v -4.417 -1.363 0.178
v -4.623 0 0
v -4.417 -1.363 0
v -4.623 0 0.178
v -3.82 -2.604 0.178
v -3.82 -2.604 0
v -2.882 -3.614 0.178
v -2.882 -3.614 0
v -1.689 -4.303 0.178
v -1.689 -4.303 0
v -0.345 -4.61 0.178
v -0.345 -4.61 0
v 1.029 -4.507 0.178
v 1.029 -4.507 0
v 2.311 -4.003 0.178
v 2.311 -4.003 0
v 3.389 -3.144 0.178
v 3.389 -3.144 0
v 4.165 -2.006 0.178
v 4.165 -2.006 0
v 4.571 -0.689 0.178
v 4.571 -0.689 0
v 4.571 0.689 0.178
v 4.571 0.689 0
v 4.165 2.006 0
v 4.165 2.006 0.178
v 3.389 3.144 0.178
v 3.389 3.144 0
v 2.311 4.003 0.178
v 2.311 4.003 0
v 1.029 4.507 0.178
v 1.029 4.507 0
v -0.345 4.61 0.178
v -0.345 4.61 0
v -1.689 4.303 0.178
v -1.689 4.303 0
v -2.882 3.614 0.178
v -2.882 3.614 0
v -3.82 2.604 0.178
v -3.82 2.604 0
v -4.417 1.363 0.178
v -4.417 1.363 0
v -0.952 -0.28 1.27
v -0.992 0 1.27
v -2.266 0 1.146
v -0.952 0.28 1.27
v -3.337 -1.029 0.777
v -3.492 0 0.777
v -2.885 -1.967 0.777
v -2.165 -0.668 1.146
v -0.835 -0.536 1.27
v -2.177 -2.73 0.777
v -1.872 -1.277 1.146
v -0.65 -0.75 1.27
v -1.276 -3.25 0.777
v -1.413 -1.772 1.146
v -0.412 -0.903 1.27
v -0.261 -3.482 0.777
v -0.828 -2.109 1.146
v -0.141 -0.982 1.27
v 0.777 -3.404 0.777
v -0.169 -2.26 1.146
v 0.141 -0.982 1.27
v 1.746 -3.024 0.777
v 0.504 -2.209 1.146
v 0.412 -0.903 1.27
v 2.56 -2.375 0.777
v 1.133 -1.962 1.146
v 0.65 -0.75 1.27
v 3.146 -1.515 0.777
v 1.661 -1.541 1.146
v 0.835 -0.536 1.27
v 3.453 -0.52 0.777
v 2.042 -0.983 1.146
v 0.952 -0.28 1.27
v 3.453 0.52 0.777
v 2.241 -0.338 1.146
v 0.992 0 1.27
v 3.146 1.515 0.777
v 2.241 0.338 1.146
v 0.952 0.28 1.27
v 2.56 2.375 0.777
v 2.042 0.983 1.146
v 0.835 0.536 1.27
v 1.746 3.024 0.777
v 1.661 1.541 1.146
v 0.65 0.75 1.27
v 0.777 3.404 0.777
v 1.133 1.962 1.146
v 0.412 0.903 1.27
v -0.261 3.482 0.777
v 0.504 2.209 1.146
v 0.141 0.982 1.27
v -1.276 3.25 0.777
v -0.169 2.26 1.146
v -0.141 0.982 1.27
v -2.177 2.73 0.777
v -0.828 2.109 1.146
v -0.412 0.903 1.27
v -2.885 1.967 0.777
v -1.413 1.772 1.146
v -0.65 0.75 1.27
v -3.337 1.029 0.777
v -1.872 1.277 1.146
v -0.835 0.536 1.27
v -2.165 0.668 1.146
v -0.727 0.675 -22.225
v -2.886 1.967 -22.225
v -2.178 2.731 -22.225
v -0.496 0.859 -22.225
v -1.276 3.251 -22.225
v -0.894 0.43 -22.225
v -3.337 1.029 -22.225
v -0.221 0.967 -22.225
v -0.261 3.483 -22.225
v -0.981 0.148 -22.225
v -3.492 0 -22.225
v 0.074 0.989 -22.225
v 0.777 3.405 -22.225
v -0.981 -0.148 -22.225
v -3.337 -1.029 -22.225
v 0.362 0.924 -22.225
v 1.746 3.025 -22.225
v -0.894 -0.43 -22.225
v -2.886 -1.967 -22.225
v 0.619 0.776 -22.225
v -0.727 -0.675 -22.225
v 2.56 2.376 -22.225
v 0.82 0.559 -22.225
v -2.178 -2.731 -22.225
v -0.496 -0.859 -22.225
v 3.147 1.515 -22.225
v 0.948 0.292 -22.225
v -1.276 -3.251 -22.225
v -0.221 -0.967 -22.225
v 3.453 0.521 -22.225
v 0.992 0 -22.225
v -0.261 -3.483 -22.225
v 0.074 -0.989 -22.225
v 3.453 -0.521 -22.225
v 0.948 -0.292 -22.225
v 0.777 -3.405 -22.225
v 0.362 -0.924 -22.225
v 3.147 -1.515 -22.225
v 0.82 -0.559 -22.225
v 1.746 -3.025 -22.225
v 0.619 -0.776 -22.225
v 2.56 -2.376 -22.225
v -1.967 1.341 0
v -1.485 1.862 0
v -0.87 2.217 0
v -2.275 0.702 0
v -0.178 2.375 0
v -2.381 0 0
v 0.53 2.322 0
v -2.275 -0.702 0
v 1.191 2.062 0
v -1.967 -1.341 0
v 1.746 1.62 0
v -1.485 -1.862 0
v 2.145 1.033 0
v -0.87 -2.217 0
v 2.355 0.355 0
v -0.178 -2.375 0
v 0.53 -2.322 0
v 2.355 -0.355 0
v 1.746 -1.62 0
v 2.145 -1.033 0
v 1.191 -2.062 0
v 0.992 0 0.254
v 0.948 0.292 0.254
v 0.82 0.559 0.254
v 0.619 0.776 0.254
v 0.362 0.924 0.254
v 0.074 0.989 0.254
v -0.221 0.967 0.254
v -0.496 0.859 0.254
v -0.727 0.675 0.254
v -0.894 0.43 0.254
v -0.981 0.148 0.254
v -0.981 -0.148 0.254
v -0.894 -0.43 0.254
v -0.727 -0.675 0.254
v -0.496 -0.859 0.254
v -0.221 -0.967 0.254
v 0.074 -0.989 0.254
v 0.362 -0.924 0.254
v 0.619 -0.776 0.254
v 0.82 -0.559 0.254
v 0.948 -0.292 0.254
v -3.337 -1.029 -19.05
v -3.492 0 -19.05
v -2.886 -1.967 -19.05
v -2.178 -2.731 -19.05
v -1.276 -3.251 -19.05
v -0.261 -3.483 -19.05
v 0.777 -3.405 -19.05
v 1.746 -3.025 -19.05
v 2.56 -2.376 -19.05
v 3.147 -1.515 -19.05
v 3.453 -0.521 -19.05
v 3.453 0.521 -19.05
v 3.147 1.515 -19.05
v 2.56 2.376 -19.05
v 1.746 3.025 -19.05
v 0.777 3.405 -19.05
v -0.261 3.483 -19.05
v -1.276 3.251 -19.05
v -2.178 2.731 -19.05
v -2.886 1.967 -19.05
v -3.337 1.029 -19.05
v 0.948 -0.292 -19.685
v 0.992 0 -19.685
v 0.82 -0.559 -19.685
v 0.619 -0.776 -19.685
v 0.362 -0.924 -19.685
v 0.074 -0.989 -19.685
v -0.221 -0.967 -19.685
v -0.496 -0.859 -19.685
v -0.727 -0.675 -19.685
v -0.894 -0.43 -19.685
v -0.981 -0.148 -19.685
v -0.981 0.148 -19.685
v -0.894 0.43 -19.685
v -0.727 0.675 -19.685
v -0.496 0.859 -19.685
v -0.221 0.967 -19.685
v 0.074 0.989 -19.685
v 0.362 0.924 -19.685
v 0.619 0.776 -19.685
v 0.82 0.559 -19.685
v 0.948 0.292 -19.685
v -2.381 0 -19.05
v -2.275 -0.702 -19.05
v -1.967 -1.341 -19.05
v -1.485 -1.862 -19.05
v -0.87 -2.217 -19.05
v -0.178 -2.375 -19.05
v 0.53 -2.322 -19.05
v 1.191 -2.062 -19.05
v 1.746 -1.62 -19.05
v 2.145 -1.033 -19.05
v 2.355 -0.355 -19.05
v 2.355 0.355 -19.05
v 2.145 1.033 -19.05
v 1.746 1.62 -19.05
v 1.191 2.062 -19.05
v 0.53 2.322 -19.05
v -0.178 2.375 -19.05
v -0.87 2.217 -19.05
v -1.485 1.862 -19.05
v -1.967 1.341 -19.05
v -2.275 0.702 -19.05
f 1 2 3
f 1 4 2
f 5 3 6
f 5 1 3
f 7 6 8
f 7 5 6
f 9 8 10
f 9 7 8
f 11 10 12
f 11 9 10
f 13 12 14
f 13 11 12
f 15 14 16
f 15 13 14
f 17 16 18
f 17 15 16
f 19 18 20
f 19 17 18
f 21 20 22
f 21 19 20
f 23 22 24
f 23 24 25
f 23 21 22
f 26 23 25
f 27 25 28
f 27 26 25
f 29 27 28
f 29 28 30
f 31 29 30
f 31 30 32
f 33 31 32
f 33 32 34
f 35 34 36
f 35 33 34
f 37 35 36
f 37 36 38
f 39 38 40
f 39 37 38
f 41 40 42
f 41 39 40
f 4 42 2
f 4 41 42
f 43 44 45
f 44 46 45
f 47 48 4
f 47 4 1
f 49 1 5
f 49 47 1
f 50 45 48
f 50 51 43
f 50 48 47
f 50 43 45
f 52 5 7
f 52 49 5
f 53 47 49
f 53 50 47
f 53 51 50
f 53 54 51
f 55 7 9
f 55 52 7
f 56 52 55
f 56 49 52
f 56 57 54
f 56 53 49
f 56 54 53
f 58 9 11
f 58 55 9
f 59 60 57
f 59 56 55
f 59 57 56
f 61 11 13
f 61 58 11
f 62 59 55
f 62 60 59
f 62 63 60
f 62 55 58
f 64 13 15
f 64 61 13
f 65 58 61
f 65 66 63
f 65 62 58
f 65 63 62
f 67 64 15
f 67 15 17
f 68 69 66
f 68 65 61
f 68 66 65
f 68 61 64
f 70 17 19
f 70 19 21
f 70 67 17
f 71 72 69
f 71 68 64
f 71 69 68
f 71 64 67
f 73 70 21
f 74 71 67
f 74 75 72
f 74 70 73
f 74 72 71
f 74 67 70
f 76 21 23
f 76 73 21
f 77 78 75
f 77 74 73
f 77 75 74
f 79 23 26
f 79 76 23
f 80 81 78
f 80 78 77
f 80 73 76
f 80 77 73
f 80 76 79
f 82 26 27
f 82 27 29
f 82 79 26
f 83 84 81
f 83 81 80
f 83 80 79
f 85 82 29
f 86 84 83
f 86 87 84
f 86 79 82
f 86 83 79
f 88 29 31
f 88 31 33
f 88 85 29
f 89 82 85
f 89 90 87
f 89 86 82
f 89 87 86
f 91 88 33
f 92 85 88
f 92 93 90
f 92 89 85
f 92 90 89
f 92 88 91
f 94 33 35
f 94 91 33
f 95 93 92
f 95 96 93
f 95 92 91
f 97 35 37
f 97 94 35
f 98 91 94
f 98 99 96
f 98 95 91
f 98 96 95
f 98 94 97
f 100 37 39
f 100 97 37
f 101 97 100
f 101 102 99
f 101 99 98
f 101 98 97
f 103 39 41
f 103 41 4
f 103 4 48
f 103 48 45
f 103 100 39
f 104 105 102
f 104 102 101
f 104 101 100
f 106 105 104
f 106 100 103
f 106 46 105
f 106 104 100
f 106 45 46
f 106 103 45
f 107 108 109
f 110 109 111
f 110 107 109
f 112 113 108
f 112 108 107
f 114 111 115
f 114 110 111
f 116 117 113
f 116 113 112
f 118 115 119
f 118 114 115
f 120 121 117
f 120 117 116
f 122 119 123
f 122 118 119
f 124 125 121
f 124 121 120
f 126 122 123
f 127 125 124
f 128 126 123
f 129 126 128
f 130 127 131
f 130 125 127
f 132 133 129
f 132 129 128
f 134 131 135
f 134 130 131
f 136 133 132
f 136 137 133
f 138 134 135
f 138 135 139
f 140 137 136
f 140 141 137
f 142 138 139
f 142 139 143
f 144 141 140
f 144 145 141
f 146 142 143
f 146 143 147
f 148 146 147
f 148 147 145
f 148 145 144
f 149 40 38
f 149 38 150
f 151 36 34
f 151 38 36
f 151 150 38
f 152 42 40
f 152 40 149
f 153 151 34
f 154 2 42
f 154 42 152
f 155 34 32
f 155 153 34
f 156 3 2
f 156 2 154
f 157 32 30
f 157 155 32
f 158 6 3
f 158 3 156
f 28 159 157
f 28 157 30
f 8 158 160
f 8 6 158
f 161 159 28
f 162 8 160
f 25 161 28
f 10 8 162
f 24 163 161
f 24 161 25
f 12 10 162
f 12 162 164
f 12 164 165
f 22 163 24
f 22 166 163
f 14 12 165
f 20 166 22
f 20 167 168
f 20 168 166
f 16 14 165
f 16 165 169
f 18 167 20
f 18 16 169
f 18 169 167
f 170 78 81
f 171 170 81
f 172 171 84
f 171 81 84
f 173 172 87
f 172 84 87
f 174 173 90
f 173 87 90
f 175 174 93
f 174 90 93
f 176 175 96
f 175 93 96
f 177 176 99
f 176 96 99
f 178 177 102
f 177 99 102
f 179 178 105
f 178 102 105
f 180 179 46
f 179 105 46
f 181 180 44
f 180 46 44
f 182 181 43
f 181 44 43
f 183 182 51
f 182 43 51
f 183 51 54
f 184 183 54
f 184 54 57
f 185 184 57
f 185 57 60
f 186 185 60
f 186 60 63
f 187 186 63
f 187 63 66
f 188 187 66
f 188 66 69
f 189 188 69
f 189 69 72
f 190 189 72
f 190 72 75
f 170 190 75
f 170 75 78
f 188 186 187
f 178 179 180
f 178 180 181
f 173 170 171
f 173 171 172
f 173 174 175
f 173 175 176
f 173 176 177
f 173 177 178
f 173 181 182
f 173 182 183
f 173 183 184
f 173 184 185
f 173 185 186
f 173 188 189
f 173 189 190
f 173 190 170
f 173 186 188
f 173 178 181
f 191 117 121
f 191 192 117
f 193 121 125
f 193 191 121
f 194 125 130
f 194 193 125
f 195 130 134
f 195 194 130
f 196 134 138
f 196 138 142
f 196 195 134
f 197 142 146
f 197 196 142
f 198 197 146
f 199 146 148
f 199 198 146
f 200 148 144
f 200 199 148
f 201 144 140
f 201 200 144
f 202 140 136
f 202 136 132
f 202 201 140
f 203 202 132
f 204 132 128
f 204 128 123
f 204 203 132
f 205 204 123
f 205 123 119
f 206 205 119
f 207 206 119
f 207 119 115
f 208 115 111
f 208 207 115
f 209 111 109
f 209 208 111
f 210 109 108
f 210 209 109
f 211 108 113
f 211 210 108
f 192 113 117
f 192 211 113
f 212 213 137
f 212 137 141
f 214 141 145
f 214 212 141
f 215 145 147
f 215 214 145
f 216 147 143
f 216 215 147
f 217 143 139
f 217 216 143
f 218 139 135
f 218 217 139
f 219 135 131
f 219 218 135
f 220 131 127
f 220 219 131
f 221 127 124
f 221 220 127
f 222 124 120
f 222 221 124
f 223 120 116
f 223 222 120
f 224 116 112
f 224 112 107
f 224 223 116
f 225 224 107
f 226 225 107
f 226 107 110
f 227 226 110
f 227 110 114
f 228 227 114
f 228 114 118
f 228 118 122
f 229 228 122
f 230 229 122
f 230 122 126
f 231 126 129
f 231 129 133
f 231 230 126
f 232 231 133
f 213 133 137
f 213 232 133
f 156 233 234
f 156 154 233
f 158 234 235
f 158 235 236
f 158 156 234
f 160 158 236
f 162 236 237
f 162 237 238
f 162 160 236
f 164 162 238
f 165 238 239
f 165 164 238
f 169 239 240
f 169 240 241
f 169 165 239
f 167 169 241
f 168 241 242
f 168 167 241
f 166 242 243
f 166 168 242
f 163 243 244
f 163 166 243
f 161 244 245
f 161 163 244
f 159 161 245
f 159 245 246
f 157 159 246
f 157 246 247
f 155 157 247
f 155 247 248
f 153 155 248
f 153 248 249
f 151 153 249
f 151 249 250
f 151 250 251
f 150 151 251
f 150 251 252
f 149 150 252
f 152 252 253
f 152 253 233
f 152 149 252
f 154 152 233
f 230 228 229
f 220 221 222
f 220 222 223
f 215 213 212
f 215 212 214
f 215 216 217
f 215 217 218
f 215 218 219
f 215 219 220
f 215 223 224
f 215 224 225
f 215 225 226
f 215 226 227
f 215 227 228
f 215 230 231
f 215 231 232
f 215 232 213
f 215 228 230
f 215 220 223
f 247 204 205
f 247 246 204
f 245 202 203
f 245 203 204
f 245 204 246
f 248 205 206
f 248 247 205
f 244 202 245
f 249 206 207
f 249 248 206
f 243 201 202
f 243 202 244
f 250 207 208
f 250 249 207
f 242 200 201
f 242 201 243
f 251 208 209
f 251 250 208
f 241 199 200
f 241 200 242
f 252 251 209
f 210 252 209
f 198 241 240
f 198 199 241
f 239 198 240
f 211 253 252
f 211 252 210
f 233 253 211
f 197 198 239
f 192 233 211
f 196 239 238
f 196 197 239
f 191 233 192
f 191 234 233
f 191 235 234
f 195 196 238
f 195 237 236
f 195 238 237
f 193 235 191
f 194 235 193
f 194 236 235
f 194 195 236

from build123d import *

# Parameters (mm, degrees)
SKETCH4_R          = 0.9921875
CUT_EXTRUDE1_DEPTH = 1.016
CUT_EXTRUDE2_START = -2.54
SKETCH3_R          = 0.9921875
CUT_EXTRUDE2_DEPTH = 2.54


with BuildPart() as part:
    # Sketch2 → Revolve1 (revolve)
    with BuildSketch(Plane(origin=(0, 0, 0), x_dir=(0, 0, -1), z_dir=(1, 0, 0)), mode=Mode.PRIVATE) as revolve1_sk:
        with BuildLine():
            Line((-1.27, 0.9921875), (-1.27, 0))
            Line((-1.27, 0), (19.05, 0))
            Line((19.05, 0), (22.225, 0))
            Line((22.225, 0), (22.225, 3.4925))
            Line((22.225, 3.4925), (19.05, 3.4925))
            Line((19.05, 3.4925), (19.05, 2.38125))
            Line((19.05, 2.38125), (0, 2.38125))
            Line((0, 2.38125), (0, 4.6228))
            Line((0, 4.6228), (-0.1778, 4.6228))
            ThreePointArc((-0.1778, 4.6228), (-0.991036966, 2.887856773), (-1.27, 0.9921875))
        make_face()
    revolve(revolve1_sk.sketch.rotate(Axis((0, 0, 7.600580616), (0, 0, 1)), 90), axis=Axis((0, 0, 7.600580616), (0, 0, 1)))

    # Sketch4 → Cut-Extrude1 (cut)
    with BuildSketch(Plane.XY.offset(1.27)):
        Circle(SKETCH4_R)
    extrude(amount=-CUT_EXTRUDE1_DEPTH, mode=Mode.SUBTRACT)

    # Sketch3 → Cut-Extrude2 (cut)
    with BuildSketch(Plane(origin=(0, 0, -22.225), x_dir=(-1, 0, 0), z_dir=(0, 0, -1)).offset(CUT_EXTRUDE2_START)):
        with Locations(Location((0, 0, 0), (0, 0, 180))):
            Circle(SKETCH3_R)
    extrude(amount=CUT_EXTRUDE2_DEPTH, mode=Mode.SUBTRACT)


solid = part.part
